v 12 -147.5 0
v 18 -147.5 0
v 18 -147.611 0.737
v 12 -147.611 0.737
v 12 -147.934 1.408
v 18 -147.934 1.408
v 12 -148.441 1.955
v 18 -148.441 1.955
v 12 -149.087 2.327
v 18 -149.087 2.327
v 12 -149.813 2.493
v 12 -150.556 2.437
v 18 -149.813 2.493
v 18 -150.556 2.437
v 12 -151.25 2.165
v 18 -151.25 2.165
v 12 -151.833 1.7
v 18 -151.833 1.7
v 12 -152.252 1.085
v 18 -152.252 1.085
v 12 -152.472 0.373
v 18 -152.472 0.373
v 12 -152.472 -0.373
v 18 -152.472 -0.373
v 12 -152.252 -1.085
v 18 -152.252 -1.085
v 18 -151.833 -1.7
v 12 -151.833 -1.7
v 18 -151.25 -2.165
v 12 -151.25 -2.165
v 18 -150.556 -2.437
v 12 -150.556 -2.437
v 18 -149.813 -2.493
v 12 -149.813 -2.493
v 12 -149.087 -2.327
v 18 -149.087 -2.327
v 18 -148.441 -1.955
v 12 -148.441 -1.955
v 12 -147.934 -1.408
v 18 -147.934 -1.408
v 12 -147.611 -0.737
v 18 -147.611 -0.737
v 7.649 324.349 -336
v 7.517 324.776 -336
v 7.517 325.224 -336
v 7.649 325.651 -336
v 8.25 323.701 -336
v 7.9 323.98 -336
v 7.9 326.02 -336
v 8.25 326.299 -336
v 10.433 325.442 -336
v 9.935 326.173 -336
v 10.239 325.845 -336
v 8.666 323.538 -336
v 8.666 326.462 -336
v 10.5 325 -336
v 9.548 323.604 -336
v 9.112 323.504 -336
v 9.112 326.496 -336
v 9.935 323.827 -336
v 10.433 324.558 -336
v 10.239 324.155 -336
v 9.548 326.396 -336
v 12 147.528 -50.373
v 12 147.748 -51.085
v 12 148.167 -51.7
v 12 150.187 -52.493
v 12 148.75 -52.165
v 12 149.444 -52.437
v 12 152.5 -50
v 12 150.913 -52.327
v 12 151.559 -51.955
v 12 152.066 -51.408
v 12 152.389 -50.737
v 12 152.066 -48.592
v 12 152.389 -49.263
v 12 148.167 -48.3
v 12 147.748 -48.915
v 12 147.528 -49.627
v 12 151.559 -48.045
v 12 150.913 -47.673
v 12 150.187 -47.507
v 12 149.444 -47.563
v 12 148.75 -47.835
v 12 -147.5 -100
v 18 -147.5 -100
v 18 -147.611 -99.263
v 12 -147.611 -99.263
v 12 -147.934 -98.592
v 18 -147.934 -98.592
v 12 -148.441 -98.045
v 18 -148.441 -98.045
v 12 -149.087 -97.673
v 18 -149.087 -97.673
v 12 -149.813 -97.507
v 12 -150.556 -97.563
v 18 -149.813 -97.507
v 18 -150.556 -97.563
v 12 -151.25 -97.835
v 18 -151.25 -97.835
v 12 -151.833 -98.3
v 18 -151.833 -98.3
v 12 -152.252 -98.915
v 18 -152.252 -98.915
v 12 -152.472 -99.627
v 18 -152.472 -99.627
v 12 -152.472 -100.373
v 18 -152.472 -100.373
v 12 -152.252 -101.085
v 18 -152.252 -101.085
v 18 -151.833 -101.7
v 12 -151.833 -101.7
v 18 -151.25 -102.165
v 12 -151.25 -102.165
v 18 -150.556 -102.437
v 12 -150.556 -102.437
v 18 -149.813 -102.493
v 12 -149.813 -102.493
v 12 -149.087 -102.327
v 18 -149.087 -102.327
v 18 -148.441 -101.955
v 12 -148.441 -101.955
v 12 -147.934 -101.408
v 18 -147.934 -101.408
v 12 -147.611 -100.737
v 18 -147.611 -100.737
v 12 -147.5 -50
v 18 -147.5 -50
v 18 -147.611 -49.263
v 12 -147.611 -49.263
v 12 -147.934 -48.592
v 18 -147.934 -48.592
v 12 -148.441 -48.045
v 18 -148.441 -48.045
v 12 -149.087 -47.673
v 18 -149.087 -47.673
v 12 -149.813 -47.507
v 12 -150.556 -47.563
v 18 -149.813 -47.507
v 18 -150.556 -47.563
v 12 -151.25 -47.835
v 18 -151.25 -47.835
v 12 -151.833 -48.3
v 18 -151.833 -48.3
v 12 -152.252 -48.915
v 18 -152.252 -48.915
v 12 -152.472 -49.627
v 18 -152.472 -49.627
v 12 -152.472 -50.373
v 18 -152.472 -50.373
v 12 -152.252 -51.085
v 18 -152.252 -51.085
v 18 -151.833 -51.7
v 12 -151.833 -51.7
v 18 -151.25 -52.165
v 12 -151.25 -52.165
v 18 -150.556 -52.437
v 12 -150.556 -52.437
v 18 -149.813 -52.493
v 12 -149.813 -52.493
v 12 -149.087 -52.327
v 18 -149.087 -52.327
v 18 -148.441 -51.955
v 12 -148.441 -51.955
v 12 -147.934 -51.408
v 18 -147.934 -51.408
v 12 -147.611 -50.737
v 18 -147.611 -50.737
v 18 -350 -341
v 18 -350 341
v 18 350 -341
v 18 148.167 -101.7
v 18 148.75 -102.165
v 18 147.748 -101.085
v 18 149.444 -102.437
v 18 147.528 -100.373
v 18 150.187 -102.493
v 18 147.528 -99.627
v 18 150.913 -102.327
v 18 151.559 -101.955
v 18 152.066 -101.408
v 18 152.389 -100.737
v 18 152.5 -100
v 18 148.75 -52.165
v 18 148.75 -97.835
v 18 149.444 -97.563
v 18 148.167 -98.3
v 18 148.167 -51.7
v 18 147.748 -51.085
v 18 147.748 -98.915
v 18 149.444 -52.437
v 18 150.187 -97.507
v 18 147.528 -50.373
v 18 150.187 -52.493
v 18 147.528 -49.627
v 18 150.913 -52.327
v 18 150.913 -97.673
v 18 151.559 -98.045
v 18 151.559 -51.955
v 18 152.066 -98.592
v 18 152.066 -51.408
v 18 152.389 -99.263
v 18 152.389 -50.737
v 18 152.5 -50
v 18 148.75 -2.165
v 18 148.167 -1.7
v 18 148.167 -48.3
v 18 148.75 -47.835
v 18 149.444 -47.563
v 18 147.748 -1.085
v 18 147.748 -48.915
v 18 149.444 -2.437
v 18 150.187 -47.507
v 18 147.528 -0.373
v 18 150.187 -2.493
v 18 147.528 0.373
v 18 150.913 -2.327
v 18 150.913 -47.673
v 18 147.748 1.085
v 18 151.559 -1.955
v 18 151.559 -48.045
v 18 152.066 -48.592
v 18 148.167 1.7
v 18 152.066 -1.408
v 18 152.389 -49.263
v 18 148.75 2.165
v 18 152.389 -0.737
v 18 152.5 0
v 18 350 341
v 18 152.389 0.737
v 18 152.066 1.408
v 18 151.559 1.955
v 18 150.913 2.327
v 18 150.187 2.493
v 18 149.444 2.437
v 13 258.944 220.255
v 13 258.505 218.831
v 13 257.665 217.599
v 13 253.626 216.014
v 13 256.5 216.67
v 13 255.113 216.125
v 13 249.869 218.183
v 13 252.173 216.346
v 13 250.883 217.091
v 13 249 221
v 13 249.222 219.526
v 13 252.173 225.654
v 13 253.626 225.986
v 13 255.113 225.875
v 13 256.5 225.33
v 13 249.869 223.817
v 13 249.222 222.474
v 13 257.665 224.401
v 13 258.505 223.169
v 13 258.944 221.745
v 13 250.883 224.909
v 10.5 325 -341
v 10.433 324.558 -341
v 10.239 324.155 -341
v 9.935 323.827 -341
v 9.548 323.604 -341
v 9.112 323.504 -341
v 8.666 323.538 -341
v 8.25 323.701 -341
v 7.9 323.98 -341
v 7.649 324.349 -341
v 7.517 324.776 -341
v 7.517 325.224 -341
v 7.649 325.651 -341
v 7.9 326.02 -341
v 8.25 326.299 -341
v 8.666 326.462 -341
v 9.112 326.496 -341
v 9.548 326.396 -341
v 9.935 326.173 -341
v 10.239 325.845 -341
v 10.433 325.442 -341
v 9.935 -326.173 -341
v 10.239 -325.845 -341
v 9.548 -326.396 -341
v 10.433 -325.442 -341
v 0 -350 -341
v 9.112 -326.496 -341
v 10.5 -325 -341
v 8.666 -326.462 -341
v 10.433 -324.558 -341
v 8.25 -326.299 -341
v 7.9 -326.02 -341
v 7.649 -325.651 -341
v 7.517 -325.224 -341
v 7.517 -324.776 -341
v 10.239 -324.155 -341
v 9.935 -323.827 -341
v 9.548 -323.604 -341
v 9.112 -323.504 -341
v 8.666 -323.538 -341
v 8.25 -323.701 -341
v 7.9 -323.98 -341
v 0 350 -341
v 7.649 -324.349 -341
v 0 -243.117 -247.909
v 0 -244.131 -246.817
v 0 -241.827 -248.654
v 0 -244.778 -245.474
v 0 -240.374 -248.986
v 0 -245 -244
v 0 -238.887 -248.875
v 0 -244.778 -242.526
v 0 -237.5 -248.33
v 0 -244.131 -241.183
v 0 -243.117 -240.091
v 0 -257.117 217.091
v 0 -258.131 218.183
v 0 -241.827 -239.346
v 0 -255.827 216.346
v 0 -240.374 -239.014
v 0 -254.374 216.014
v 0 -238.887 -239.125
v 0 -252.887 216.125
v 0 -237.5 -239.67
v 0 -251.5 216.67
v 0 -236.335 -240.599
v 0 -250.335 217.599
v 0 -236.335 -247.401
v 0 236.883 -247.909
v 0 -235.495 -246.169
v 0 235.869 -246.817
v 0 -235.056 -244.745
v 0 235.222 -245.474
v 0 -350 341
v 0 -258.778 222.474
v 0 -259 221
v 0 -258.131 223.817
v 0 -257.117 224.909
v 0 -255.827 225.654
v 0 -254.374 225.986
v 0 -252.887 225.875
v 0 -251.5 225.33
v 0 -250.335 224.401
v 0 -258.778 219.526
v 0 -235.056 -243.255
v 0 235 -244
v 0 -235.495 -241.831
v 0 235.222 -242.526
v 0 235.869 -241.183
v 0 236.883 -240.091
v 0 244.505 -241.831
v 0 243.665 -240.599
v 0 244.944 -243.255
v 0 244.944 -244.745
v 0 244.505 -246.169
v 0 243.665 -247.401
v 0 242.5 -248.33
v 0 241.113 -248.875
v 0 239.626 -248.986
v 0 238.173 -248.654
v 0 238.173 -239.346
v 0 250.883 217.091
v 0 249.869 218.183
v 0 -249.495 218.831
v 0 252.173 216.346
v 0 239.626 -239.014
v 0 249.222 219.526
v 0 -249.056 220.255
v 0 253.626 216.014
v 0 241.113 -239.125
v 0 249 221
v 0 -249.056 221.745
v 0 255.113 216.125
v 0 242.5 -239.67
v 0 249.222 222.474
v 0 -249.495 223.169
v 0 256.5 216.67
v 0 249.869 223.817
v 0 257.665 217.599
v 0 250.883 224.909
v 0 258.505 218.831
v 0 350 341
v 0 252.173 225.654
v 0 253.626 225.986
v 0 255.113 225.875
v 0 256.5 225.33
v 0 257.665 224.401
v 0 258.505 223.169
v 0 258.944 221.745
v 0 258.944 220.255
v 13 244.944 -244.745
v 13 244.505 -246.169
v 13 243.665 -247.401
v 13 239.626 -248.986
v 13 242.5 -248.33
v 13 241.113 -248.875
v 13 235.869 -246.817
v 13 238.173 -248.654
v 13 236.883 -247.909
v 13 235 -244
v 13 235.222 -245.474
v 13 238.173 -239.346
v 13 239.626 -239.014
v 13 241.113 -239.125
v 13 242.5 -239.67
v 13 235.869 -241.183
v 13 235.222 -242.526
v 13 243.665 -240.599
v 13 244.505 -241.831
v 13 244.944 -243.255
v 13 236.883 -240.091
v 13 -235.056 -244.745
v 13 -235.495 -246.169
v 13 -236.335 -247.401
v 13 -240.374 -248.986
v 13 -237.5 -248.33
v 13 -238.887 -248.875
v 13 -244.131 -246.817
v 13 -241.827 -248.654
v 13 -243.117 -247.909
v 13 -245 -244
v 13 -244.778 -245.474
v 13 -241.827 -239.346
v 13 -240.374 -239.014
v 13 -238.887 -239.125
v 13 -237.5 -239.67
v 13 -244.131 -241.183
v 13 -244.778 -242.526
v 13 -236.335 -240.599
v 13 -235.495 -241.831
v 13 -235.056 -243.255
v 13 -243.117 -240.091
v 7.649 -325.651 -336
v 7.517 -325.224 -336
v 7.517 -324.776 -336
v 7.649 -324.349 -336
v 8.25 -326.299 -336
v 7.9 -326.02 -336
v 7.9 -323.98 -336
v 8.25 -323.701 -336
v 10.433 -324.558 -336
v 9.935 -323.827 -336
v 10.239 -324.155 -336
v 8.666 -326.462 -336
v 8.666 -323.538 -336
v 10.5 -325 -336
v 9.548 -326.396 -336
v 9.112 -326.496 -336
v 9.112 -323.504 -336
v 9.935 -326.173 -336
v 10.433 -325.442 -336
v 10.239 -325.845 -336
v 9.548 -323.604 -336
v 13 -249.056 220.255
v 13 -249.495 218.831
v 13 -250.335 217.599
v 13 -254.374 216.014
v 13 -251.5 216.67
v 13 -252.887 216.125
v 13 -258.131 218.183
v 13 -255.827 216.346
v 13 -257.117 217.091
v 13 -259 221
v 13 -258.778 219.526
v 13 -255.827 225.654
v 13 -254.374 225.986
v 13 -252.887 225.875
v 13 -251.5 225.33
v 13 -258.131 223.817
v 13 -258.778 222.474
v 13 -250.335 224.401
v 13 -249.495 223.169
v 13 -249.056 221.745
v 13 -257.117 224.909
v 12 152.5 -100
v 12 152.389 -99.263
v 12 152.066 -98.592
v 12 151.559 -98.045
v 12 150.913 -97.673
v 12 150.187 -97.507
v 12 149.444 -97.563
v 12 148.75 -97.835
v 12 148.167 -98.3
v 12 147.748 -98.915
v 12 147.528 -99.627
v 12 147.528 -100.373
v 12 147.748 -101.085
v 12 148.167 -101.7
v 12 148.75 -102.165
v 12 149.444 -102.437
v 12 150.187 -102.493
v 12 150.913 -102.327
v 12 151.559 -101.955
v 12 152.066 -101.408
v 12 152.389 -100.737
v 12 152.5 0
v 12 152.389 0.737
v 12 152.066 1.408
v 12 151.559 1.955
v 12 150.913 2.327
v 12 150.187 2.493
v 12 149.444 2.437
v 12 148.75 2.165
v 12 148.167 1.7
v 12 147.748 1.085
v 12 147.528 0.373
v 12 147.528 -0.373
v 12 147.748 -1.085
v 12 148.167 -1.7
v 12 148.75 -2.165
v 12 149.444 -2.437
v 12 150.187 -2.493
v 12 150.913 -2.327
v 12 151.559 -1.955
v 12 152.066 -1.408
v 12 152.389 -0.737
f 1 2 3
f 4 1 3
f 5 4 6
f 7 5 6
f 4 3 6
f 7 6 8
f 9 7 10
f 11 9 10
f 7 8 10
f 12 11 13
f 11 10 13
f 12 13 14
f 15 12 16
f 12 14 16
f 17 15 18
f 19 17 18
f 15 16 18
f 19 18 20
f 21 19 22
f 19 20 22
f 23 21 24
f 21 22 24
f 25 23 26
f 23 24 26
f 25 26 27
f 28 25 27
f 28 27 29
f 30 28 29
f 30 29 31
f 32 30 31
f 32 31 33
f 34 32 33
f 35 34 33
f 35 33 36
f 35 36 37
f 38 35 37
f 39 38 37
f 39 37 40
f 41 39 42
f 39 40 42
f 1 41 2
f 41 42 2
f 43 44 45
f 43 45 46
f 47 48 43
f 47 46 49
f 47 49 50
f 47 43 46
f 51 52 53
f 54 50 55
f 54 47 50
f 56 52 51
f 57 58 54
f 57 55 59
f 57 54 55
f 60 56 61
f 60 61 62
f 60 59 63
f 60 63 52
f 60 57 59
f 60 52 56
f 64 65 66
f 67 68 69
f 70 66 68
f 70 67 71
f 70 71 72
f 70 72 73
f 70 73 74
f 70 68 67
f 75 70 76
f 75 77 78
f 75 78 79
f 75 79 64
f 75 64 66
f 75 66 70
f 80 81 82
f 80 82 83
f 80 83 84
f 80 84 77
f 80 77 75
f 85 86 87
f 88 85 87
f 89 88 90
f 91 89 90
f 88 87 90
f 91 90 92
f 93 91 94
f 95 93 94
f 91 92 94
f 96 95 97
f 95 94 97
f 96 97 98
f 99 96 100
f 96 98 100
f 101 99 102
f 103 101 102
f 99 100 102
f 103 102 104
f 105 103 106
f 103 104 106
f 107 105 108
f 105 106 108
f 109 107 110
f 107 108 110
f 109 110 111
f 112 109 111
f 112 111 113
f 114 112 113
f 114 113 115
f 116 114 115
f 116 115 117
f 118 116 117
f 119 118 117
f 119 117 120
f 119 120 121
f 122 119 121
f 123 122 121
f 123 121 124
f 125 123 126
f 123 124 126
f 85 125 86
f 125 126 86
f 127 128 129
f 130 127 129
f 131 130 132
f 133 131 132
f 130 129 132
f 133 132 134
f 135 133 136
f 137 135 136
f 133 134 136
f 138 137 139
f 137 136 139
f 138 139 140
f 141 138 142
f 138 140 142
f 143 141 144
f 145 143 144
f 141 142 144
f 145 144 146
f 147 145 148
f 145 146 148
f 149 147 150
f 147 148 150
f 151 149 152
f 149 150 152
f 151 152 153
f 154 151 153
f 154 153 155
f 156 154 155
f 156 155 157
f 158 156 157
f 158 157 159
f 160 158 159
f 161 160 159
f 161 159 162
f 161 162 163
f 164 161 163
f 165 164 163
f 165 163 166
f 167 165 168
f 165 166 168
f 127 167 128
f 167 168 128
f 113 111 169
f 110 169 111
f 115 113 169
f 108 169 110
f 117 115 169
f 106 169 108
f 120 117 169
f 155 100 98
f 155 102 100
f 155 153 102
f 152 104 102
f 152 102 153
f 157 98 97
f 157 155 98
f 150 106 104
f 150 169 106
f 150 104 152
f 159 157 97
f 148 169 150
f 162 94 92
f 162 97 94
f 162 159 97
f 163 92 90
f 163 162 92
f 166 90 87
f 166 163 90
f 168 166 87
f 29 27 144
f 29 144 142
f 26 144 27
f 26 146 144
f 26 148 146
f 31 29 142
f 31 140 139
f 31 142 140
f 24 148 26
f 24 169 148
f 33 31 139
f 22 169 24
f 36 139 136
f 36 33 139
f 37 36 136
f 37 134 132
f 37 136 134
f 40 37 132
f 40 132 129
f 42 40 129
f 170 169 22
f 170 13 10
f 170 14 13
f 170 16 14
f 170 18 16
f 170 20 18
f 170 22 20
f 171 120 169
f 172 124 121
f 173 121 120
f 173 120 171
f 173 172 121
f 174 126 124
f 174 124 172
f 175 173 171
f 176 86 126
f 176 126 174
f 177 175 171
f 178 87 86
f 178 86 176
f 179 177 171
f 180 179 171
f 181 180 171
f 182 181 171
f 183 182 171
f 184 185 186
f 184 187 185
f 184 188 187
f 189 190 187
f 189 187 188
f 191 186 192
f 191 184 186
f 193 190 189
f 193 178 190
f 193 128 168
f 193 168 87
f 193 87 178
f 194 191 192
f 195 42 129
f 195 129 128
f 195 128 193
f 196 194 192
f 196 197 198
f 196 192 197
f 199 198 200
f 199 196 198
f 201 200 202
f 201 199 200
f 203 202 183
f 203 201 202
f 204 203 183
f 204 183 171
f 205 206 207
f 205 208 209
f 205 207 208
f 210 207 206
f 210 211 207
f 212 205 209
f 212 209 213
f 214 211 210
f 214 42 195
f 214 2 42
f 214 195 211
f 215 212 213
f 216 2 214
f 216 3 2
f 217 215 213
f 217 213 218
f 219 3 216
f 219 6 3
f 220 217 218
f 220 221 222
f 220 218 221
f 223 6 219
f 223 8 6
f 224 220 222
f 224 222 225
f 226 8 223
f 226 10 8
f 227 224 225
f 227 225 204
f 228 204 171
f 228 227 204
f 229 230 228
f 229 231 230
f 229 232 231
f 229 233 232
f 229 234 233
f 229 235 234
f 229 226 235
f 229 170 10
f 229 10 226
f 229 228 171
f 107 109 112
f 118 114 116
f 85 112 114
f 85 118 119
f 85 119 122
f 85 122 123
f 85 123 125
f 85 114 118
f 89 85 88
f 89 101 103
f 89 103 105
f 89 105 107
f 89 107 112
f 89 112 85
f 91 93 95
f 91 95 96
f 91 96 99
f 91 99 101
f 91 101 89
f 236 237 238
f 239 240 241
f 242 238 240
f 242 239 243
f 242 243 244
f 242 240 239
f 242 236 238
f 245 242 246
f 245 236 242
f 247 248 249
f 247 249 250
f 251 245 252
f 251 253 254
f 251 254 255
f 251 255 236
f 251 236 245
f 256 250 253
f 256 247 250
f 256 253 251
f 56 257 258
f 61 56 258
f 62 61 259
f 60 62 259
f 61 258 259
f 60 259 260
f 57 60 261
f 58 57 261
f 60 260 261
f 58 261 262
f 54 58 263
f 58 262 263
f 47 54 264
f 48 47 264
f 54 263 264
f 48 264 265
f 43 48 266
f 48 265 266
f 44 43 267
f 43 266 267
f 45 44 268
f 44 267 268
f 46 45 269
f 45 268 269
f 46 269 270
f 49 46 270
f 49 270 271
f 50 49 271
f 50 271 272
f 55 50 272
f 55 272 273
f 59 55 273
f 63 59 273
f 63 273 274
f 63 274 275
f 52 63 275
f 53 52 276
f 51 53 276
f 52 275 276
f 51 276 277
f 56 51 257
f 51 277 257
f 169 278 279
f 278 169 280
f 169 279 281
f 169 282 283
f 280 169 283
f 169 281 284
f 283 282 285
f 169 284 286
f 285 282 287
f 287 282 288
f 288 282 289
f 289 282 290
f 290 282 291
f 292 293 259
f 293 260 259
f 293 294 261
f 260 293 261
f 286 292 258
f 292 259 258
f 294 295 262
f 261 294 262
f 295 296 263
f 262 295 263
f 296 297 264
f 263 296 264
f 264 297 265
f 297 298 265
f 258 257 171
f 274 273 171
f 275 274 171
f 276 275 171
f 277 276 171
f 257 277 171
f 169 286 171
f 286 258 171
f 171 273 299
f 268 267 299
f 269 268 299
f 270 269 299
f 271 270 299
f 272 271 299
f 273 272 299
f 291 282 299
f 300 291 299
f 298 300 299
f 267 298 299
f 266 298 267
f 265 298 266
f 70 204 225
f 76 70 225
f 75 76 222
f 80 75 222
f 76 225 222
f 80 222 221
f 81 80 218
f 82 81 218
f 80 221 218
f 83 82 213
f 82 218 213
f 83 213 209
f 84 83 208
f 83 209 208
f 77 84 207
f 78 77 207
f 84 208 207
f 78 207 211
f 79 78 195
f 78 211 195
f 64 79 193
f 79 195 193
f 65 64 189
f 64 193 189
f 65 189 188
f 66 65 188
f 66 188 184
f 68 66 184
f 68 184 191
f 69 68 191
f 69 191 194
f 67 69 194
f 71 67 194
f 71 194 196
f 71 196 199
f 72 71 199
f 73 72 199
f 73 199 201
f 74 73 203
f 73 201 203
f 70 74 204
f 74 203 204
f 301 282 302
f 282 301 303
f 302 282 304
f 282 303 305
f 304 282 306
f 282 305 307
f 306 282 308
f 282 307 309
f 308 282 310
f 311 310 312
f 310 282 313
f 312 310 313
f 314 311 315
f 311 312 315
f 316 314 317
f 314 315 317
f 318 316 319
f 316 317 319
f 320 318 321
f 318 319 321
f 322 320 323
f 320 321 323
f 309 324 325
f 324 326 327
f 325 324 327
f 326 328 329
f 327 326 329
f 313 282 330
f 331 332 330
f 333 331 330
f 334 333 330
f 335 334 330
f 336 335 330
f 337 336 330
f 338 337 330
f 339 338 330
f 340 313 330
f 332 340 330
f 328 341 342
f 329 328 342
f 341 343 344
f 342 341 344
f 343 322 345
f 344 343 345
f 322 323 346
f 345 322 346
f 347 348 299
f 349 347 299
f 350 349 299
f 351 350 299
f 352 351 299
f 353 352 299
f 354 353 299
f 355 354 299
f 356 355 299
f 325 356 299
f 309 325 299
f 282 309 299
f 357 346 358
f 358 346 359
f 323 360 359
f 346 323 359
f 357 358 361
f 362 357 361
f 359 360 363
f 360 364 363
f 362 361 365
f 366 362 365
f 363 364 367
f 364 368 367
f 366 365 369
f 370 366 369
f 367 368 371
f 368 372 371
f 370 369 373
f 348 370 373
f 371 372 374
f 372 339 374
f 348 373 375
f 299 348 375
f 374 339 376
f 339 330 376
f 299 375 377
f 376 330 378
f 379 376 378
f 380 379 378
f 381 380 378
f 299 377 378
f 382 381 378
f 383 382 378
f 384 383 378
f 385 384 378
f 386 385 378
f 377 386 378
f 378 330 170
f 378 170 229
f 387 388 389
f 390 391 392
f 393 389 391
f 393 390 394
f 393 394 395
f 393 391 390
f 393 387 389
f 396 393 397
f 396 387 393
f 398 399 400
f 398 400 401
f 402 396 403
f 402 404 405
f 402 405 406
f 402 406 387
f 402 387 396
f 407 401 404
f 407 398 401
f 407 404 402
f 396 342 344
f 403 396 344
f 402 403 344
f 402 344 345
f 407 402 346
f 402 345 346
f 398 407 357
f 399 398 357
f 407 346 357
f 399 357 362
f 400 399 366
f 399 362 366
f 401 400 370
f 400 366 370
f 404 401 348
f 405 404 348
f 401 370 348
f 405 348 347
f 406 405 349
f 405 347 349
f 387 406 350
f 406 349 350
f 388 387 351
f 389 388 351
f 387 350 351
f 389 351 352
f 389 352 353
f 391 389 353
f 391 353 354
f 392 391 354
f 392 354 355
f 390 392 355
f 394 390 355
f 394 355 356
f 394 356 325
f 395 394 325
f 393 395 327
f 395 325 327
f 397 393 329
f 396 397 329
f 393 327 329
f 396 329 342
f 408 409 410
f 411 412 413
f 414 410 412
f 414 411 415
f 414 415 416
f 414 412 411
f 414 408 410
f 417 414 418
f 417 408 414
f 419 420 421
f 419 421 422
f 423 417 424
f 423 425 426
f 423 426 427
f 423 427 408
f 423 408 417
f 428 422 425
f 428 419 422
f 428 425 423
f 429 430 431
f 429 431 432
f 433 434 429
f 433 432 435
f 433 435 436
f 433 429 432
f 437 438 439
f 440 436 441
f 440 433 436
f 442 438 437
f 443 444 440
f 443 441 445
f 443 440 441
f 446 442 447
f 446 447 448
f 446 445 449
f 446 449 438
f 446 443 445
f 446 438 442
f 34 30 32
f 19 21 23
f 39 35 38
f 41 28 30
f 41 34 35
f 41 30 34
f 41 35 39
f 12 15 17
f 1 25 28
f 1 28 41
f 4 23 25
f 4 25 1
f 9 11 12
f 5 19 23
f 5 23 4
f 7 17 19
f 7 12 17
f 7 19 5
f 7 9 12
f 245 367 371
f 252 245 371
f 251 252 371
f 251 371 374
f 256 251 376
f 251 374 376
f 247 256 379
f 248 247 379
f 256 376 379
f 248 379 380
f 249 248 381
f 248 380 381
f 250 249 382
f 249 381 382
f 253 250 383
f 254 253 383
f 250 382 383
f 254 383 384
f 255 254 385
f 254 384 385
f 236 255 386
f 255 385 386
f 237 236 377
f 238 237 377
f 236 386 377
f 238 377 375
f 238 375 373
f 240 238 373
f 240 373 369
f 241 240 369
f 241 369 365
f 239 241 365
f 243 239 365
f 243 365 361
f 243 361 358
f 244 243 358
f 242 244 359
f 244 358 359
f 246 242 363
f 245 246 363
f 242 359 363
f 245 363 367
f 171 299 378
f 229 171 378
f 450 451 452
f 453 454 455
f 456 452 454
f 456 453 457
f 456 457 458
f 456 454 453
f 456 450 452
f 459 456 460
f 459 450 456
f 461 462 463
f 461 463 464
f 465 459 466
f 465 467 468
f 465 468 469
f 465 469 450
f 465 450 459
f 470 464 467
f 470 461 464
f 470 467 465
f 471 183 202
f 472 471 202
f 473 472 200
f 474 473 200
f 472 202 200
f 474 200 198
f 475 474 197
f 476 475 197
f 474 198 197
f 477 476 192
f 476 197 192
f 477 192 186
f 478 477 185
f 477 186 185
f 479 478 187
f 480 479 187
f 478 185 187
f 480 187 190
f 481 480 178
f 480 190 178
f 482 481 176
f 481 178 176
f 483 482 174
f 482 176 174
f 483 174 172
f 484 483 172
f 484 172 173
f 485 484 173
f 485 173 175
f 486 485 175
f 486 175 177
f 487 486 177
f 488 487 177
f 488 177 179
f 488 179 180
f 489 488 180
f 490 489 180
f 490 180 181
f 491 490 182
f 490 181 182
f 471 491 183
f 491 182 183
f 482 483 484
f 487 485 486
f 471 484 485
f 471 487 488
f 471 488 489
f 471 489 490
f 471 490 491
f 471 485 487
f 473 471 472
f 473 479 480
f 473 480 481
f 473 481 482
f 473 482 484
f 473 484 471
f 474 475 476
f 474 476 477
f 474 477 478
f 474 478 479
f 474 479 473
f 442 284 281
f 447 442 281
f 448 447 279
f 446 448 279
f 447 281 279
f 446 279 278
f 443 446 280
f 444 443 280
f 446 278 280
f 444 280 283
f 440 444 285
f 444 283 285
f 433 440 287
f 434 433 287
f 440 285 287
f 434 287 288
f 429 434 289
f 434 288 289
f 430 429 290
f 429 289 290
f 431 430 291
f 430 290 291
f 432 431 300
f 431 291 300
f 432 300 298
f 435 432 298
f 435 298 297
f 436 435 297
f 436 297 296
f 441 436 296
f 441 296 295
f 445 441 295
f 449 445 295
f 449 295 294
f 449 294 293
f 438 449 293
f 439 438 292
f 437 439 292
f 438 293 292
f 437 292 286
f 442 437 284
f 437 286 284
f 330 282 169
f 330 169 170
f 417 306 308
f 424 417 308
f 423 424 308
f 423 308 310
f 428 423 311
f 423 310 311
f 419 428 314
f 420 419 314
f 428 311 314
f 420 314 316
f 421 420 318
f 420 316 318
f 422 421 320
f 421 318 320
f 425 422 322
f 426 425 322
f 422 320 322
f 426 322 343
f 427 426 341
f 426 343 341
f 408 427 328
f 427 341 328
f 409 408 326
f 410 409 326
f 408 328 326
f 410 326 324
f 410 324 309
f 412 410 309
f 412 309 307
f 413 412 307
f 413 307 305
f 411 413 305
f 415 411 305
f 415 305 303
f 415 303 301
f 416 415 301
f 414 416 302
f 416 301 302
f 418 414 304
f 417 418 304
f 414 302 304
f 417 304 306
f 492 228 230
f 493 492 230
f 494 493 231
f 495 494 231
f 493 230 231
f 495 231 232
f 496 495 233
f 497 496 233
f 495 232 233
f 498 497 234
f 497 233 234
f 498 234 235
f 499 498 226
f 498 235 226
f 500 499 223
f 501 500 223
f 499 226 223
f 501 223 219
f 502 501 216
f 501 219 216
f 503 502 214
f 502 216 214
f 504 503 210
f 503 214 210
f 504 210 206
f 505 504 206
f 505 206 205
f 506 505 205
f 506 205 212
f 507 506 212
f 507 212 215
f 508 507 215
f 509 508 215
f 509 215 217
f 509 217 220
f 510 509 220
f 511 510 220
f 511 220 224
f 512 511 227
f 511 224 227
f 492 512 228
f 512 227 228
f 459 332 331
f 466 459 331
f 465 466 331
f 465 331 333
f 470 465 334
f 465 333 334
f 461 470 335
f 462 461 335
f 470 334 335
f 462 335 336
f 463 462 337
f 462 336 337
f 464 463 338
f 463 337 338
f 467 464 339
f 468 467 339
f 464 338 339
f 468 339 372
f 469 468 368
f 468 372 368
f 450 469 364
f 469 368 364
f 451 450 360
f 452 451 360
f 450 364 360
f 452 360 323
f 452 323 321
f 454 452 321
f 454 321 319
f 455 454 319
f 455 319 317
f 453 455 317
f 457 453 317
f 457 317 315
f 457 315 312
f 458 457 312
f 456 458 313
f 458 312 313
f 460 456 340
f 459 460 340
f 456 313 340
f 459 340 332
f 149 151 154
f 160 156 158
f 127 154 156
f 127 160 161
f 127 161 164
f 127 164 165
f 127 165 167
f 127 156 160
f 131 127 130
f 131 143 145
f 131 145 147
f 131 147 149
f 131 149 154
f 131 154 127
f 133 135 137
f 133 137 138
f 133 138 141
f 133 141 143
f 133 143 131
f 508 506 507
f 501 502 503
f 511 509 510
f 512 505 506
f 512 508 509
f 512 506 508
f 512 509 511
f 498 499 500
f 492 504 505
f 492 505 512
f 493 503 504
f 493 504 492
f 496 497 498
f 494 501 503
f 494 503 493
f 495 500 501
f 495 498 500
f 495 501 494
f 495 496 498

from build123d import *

# Parameters (mm, degrees)
F0_W     = 700
F0_H     = 682
F1_DEPTH = 18
F2_R     = 1.5
F3_DEPTH = 5
F4_R     = 5
F5_DEPTH = 13
F6_R     = 2.5
F7_DEPTH = 6


with BuildPart() as f1:
    # F0 (on Right) → F1 (new body)
    with BuildSketch(Plane.YZ):
        Rectangle(F0_W, F0_H)
    extrude(amount=F1_DEPTH)

    # F2 (on face) → F3 (cut)
    with BuildSketch(Plane(origin=(0, 0, -341), x_dir=(1, 0, 0), z_dir=(0, 0, -1))):
        with Locations((9, 325)):
            Circle(F2_R)
        with Locations((9, -325)):
            Circle(F2_R)
    extrude(amount=-F3_DEPTH, mode=Mode.SUBTRACT)

    # F4 (on face) → F5 (cut)
    with BuildSketch(Plane(origin=(0, 0, 0), x_dir=(0, -1, 0), z_dir=(-1, 0, 0))):
        with Locations((-254, 221)):
            Circle(F4_R)
        with Locations((254, 221)):
            Circle(F4_R)
        with Locations((-240, -244)):
            Circle(F4_R)
        with Locations((240, -244)):
            Circle(F4_R)
    extrude(amount=-F5_DEPTH, mode=Mode.SUBTRACT)

    # F6 (on face) → F7 (cut)
    with BuildSketch(Plane.YZ.offset(18)):
        with Locations((-150, 0)):
            Circle(F6_R)
        with Locations((150, 0)):
            Circle(F6_R)
        with Locations((-150, -50)):
            Circle(F6_R)
        with Locations((150, -50)):
            Circle(F6_R)
        with Locations((-150, -100)):
            Circle(F6_R)
        with Locations((150, -100)):
            Circle(F6_R)
    extrude(amount=-F7_DEPTH, mode=Mode.SUBTRACT)


solid = f1.part
